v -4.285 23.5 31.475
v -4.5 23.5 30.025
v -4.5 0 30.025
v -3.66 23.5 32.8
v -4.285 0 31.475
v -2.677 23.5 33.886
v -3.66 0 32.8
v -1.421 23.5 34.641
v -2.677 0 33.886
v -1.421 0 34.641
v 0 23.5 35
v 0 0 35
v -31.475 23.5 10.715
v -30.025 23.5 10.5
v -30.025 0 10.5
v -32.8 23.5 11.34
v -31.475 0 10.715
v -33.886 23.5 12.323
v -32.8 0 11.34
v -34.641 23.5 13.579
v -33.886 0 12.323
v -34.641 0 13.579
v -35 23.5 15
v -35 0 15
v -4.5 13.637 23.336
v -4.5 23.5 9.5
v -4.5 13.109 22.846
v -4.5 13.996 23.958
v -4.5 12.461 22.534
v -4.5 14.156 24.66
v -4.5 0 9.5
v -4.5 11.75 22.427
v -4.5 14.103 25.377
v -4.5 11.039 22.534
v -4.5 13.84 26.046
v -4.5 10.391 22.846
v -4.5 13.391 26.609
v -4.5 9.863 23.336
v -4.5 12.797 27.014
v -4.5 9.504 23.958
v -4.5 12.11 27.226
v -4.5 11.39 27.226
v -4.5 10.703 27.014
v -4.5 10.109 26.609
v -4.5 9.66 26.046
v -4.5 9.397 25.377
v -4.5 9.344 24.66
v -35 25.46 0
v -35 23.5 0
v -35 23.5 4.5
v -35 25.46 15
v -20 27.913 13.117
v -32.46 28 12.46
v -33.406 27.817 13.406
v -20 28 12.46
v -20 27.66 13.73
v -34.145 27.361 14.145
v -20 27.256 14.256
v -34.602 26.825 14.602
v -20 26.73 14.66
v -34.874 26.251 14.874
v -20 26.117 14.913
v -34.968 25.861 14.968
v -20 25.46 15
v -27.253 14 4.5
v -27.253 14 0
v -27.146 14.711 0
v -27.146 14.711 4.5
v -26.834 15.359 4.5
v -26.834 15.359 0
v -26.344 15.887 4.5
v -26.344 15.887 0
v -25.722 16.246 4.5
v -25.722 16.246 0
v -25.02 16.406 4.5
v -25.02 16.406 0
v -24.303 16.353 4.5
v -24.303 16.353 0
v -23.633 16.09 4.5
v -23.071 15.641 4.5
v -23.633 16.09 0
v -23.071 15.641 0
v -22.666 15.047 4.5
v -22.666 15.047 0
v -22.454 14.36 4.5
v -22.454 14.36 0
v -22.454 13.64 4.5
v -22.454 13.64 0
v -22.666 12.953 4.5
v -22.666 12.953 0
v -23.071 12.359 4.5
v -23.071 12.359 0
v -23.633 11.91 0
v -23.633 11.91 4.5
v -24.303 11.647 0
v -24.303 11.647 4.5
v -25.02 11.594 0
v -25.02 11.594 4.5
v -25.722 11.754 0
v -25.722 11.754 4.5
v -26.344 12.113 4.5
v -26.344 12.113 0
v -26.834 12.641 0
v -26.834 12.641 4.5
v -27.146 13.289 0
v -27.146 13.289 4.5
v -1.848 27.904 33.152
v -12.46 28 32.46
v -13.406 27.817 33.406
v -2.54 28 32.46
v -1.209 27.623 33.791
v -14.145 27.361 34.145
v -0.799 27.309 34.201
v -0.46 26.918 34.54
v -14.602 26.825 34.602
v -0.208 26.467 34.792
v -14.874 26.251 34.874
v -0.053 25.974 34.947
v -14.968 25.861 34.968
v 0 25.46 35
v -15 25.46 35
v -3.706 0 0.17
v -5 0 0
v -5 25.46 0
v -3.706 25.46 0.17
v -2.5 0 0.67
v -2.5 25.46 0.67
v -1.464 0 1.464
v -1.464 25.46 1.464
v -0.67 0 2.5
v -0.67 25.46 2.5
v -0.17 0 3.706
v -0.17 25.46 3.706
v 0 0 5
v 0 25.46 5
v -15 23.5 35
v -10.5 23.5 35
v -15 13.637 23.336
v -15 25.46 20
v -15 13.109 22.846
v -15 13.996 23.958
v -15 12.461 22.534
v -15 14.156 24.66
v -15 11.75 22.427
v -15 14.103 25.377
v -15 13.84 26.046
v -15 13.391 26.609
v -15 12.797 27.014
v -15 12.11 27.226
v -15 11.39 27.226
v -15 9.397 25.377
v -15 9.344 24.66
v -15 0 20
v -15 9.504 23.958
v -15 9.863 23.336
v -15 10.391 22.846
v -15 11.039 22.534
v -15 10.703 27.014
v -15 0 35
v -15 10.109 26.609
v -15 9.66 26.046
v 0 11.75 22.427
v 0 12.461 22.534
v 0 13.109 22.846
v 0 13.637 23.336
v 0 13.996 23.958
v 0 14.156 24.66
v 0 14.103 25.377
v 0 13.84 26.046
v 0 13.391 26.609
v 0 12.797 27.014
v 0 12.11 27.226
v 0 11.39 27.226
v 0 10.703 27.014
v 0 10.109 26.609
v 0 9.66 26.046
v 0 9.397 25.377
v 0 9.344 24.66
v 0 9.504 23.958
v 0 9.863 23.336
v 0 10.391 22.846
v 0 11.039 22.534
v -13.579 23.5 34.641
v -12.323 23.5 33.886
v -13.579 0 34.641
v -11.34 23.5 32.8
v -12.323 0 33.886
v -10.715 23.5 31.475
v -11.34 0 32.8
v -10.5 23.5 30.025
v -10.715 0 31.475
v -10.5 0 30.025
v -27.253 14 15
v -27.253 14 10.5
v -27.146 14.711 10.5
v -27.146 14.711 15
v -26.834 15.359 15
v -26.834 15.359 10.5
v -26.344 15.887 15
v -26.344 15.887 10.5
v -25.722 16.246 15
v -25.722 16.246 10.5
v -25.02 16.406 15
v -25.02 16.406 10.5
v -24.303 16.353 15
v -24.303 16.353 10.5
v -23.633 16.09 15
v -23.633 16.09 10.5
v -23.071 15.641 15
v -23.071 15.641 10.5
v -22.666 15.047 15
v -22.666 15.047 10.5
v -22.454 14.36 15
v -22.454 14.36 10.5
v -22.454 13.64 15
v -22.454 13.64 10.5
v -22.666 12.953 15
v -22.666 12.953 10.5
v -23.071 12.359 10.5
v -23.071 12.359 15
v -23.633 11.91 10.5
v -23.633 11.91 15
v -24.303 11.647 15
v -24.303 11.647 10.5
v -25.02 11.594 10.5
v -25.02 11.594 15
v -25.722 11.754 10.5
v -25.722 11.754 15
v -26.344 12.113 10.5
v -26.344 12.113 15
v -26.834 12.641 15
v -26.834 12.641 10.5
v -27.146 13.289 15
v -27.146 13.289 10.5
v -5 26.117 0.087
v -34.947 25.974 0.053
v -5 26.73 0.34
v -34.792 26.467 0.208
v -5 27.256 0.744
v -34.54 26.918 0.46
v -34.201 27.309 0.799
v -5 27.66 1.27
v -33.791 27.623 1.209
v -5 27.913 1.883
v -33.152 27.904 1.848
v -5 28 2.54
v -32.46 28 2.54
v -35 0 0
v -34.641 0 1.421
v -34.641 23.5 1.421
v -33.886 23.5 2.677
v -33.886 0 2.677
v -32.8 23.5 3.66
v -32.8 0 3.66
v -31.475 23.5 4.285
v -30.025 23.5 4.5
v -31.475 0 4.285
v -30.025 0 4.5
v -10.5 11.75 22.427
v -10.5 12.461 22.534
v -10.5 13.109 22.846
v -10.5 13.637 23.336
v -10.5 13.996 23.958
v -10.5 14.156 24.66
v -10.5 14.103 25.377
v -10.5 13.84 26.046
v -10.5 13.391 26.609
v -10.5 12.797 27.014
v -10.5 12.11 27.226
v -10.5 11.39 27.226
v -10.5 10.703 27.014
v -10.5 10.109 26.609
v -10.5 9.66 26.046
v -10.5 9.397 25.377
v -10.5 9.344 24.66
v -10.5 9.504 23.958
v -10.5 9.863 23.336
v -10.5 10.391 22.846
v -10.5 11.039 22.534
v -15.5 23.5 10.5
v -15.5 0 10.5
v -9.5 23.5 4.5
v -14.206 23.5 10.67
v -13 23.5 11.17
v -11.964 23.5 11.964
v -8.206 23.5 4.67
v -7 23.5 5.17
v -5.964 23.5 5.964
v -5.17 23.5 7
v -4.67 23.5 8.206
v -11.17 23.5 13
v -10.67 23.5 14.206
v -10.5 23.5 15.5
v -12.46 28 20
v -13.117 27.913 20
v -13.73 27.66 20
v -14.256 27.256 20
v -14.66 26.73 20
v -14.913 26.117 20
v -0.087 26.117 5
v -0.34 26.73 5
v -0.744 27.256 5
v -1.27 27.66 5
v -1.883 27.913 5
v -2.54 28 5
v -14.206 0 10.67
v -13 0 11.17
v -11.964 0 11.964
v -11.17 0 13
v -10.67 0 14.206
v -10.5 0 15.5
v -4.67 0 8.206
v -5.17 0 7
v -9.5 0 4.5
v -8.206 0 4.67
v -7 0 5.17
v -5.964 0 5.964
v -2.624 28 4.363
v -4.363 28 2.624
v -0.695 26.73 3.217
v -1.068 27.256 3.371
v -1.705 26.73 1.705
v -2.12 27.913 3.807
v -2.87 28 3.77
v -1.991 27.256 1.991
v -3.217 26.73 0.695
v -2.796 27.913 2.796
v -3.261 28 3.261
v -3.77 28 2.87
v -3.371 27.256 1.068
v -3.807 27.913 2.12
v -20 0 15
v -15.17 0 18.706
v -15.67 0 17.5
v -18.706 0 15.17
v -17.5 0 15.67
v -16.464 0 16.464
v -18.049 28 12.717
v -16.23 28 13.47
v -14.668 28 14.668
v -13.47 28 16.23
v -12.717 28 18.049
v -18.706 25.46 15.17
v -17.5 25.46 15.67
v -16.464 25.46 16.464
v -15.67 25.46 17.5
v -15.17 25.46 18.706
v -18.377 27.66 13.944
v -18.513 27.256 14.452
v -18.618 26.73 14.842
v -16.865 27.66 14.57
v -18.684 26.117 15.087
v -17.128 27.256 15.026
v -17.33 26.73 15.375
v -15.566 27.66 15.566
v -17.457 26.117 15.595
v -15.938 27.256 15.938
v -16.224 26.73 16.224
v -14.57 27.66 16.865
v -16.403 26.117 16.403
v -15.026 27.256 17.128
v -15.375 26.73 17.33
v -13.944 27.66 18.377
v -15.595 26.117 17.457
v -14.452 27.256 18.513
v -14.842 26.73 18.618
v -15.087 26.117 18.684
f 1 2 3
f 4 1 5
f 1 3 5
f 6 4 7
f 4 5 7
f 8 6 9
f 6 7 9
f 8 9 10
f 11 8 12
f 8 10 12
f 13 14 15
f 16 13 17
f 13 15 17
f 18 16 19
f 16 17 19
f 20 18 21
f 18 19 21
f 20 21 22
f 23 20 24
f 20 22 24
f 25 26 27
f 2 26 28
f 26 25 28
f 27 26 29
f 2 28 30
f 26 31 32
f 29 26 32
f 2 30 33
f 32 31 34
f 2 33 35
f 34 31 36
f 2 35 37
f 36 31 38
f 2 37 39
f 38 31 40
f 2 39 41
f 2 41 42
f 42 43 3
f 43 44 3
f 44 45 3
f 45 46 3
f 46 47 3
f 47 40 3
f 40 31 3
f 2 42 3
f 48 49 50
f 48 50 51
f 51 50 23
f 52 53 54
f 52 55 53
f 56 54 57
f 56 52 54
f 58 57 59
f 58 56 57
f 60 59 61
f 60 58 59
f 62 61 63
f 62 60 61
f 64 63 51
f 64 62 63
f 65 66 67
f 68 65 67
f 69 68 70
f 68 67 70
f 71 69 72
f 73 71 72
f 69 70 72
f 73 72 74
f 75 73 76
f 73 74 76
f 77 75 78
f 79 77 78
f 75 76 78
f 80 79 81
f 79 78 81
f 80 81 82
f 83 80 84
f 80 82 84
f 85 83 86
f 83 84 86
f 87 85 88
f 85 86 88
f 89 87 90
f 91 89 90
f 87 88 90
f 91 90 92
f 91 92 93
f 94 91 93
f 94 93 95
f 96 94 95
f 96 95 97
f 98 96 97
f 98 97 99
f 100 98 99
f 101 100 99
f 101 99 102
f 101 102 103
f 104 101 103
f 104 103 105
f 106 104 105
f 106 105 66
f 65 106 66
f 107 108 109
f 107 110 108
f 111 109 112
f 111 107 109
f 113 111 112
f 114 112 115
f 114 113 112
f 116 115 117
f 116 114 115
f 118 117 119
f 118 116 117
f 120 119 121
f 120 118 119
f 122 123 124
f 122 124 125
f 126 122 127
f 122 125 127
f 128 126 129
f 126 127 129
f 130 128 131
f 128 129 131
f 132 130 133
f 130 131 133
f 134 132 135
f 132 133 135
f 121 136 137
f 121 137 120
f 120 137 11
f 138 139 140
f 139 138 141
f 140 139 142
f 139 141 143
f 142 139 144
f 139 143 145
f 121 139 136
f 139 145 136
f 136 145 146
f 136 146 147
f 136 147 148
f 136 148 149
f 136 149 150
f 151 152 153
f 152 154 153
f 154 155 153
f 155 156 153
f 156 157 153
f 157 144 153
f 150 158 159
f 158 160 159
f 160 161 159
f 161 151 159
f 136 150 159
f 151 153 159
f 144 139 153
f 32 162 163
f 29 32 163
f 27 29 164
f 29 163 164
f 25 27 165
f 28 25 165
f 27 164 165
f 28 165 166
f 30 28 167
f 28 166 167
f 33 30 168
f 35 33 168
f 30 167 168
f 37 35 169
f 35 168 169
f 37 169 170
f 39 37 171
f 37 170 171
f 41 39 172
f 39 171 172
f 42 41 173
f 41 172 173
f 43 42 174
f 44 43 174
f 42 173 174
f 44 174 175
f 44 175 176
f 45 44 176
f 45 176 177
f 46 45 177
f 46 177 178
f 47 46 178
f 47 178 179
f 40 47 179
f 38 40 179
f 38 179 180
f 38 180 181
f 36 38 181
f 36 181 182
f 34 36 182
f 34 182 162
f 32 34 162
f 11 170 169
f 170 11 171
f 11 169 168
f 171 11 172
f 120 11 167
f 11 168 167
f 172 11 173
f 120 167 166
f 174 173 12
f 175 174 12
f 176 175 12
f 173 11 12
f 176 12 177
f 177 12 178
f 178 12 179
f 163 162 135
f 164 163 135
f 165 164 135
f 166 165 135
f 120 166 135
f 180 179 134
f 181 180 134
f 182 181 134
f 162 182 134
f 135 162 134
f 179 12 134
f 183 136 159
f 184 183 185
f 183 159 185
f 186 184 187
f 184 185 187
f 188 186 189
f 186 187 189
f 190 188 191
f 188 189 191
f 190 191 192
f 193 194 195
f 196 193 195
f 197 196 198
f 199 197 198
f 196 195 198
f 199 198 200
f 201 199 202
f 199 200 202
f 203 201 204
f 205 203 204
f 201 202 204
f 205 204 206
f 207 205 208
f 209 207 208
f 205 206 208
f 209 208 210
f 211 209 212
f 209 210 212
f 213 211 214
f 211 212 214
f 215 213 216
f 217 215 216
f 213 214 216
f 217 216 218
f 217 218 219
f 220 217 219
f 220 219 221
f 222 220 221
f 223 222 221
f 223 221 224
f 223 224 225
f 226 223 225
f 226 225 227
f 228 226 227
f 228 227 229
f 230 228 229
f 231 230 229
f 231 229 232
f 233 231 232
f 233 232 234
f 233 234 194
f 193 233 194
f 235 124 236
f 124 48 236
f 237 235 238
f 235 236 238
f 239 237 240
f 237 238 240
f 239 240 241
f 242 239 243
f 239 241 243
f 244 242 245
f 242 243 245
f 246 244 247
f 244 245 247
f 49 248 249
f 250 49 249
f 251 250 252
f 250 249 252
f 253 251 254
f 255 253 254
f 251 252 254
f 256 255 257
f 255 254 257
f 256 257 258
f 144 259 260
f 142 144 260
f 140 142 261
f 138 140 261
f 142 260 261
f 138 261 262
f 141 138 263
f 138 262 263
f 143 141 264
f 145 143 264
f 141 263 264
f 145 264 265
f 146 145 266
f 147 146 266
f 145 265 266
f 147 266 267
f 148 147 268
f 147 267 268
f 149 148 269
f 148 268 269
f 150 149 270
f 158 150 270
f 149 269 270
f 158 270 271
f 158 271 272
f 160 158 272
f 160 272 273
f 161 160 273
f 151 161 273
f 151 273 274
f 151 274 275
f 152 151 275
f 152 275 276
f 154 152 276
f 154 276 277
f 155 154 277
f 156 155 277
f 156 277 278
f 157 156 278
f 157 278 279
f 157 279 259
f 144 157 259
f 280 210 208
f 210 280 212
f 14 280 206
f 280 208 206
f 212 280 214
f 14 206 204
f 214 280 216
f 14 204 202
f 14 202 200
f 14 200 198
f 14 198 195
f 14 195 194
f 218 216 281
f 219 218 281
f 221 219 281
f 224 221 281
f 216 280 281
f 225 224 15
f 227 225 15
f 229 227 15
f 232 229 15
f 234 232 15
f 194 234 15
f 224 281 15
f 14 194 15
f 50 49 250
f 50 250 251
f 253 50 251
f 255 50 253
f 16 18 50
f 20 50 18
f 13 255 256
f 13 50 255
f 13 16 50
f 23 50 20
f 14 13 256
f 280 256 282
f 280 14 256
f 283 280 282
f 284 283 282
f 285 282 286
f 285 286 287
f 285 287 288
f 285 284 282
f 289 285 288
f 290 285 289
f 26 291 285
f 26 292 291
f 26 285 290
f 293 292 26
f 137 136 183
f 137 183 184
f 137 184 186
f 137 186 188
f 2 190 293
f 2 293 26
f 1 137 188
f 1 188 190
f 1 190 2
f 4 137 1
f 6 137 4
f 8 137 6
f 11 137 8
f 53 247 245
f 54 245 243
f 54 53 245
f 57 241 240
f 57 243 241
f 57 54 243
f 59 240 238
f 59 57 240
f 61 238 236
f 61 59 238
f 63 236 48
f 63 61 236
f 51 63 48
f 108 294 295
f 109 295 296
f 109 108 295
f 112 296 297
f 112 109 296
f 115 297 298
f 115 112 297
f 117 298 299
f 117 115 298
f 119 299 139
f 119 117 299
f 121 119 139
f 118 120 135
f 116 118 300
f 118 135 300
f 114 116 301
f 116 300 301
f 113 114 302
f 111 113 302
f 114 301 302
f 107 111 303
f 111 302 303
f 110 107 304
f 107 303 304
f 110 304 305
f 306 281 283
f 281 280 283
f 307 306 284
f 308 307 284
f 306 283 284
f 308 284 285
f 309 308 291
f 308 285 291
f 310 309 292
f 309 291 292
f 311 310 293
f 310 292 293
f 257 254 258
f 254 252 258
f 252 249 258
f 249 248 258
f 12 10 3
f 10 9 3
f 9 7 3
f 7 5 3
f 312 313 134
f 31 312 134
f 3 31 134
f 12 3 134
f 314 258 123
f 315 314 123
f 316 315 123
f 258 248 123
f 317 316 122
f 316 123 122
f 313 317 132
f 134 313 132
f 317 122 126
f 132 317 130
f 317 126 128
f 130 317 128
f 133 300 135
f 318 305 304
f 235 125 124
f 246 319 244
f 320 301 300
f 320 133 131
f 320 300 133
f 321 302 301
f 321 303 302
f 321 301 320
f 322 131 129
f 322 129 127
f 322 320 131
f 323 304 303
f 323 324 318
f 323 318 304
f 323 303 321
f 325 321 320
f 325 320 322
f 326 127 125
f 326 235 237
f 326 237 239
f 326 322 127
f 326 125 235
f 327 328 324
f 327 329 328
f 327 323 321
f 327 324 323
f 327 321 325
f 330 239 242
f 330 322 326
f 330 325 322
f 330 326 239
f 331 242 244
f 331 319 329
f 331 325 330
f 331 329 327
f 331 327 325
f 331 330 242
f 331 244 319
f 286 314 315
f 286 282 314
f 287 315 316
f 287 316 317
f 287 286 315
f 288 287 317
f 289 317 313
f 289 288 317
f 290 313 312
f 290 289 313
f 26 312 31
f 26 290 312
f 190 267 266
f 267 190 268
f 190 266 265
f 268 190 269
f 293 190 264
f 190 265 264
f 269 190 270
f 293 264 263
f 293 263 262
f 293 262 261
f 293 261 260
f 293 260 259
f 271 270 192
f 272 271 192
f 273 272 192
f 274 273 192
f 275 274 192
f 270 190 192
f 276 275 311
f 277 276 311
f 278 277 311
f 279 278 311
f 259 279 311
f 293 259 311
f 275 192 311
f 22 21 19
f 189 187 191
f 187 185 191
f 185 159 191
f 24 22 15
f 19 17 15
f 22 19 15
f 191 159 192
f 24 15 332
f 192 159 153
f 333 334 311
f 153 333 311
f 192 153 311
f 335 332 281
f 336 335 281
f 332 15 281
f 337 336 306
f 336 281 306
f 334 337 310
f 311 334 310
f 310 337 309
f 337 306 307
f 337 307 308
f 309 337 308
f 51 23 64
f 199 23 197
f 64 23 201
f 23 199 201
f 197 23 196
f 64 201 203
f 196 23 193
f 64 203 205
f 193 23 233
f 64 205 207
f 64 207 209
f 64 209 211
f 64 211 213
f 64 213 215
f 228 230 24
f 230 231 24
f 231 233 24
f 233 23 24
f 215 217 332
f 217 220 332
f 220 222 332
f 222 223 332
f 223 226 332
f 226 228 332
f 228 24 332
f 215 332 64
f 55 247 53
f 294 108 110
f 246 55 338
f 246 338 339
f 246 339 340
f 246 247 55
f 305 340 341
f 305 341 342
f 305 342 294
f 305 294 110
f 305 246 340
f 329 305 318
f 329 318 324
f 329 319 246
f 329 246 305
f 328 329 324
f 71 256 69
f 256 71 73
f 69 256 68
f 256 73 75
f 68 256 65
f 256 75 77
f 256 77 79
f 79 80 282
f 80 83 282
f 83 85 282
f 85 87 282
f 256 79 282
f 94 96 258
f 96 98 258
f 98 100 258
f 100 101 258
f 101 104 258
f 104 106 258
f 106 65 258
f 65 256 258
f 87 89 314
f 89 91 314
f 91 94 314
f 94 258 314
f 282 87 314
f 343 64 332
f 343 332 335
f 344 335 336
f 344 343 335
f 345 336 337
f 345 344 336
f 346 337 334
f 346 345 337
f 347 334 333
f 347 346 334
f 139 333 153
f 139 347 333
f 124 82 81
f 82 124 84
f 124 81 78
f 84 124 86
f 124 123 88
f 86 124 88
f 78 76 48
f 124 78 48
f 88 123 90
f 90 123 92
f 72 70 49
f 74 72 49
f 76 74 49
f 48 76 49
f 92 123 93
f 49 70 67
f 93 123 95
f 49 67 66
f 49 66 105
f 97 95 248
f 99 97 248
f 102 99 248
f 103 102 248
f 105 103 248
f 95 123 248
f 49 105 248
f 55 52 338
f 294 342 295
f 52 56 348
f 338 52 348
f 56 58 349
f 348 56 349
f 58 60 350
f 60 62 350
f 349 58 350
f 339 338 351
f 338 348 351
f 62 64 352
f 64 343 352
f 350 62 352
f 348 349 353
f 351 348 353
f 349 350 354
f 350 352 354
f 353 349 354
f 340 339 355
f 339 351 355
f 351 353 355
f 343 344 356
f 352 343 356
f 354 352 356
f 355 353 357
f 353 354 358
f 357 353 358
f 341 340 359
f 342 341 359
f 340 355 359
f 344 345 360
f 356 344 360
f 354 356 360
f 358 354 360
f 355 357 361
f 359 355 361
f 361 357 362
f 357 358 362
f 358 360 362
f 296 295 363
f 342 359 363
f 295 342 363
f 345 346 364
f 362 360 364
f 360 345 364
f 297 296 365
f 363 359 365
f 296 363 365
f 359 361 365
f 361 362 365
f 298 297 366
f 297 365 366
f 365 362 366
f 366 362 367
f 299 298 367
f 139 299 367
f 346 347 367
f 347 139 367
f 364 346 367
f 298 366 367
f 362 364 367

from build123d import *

# Parameters (mm, degrees)
BOSS_EXTRUDE1_DEPTH = 28
CUT_EXTRUDE1_DEPTH  = 23.5
FILLET1_R           = 5
FILLET3_R           = 5
FILLET4_R           = 5
SKETCH3_R           = 2.413
CUT_EXTRUDE2_DEPTH  = 57.868268832
SKETCH4_R           = 2.413
CUT_EXTRUDE3_DEPTH  = 57.868268832
FILLET5_R           = 2.54


with BuildPart() as part:
    # Sketch1 → Boss-Extrude1 (new body)
    with BuildSketch(Plane(origin=(0, 0, 0), x_dir=(1, 0, 0), z_dir=(0, 1, 0))):
        Polygon((0, 0), (-35, 0), (-35, -15), (-15, -15), (-15, -35), (0, -35), align=None)
    extrude(amount=BOSS_EXTRUDE1_DEPTH)

    # Sketch2 → Cut-Extrude1 (cut)
    with BuildSketch(Plane.XZ):
        Polygon((-35, 4.5), (-4.5, 4.5), (-4.5, 35), (-10.5, 35), (-10.5, 10.5), (-35, 10.5), align=None)
    extrude(amount=-CUT_EXTRUDE1_DEPTH, mode=Mode.SUBTRACT)

    # Fillet1
    fillet1_edges = [part.edges().sort_by_distance(p)[0] for p in [
        (-10.5, 11.75, 10.5),
        (-4.5, 11.75, 4.5),
    ]]
    fillet(fillet1_edges, radius=FILLET1_R)

    # Fillet3
    # the kernel refuses this fillet: 5 mm, written as the material it takes off along each edge
    with BuildSketch(Plane(origin=(-4.5, -12.437342964, 35), x_dir=(0, 0, -1), z_dir=(0, 1, 0))) as fillet3_piece_1:
        with BuildLine():
            CenterArc((4.974937186, -5), FILLET3_R, 90, 84.260829523)
            Line((0, -4.5), (0, 0))
            Line((0, 0), (4.974937186, 0))
        make_face()
    extrude(amount=35.937342964, mode=Mode.SUBTRACT)
    with BuildSketch(Plane(origin=(-10.5, -12.437342964, 35), x_dir=(-1, 0, 0), z_dir=(0, 1, 0))) as fillet3_piece_2:
        with BuildLine():
            CenterArc((5, -4.974937186), FILLET3_R, 95.739170477, 84.260829523)
            Line((0, -4.974937186), (0, 0))
            Line((0, 0), (4.5, 0))
        make_face()
    extrude(amount=35.937342964, mode=Mode.SUBTRACT)
    with BuildSketch(Plane(origin=(-35, -12.437342964, 10.5), x_dir=(0, 0, 1), z_dir=(0, 1, 0))) as fillet3_piece_3:
        with BuildLine():
            CenterArc((5, 4.974937186), FILLET3_R, 180, 84.260829523)
            Line((0, 4.974937186), (0, 0))
            Line((0, 0), (4.5, 0))
        make_face()
    extrude(amount=35.937342964, mode=Mode.SUBTRACT)
    with BuildSketch(Plane(origin=(-35, -12.437342964, 4.5), x_dir=(1, 0, 0), z_dir=(0, 1, 0))) as fillet3_piece_4:
        with BuildLine():
            CenterArc((4.974937186, 5), FILLET3_R, 185.739170477, 84.260829523)
            Line((0, 4.5), (0, 0))
            Line((0, 0), (4.974937186, 0))
        make_face()
    extrude(amount=35.937342964, mode=Mode.SUBTRACT)

    # Fillet4
    fillet4_edges = [part.edges().sort_by_distance(p)[0] for p in [
        (-15, 14, 15),
        (0, 14, 0),
    ]]
    fillet(fillet4_edges, radius=FILLET4_R)

    # Sketch3 → Cut-Extrude2 (cut, through all)
    with BuildSketch(Plane(origin=(0, 0, 0), x_dir=(0, 0, -1), z_dir=(1, 0, 0))):
        with Locations((-24.84, 11.75)):
            Circle(SKETCH3_R)
    extrude(amount=-CUT_EXTRUDE2_DEPTH, mode=Mode.SUBTRACT)

    # Sketch4 → Cut-Extrude3 (cut, through all)
    with BuildSketch(Plane(origin=(0, 0, 0), x_dir=(-1, 0, 0), z_dir=(0, 0, -1))):
        with Locations((24.84, 14)):
            Circle(SKETCH4_R)
    extrude(amount=-CUT_EXTRUDE3_DEPTH, mode=Mode.SUBTRACT)

    # Fillet5
    fillet5_edges = [part.edges().sort_by_distance(p)[0] for p in [
        (-20, 28, 0),
        (-15, 28, 27.5),
        (-1.464466094, 28, 1.464466094),
        (-16.464466094, 28, 16.464466094),
        (-35, 28, 7.5),
        (-27.5, 28, 15),
        (-7.5, 28, 35),
        (0, 28, 20),
    ]]
    fillet(fillet5_edges, radius=FILLET5_R)


solid = part.part
